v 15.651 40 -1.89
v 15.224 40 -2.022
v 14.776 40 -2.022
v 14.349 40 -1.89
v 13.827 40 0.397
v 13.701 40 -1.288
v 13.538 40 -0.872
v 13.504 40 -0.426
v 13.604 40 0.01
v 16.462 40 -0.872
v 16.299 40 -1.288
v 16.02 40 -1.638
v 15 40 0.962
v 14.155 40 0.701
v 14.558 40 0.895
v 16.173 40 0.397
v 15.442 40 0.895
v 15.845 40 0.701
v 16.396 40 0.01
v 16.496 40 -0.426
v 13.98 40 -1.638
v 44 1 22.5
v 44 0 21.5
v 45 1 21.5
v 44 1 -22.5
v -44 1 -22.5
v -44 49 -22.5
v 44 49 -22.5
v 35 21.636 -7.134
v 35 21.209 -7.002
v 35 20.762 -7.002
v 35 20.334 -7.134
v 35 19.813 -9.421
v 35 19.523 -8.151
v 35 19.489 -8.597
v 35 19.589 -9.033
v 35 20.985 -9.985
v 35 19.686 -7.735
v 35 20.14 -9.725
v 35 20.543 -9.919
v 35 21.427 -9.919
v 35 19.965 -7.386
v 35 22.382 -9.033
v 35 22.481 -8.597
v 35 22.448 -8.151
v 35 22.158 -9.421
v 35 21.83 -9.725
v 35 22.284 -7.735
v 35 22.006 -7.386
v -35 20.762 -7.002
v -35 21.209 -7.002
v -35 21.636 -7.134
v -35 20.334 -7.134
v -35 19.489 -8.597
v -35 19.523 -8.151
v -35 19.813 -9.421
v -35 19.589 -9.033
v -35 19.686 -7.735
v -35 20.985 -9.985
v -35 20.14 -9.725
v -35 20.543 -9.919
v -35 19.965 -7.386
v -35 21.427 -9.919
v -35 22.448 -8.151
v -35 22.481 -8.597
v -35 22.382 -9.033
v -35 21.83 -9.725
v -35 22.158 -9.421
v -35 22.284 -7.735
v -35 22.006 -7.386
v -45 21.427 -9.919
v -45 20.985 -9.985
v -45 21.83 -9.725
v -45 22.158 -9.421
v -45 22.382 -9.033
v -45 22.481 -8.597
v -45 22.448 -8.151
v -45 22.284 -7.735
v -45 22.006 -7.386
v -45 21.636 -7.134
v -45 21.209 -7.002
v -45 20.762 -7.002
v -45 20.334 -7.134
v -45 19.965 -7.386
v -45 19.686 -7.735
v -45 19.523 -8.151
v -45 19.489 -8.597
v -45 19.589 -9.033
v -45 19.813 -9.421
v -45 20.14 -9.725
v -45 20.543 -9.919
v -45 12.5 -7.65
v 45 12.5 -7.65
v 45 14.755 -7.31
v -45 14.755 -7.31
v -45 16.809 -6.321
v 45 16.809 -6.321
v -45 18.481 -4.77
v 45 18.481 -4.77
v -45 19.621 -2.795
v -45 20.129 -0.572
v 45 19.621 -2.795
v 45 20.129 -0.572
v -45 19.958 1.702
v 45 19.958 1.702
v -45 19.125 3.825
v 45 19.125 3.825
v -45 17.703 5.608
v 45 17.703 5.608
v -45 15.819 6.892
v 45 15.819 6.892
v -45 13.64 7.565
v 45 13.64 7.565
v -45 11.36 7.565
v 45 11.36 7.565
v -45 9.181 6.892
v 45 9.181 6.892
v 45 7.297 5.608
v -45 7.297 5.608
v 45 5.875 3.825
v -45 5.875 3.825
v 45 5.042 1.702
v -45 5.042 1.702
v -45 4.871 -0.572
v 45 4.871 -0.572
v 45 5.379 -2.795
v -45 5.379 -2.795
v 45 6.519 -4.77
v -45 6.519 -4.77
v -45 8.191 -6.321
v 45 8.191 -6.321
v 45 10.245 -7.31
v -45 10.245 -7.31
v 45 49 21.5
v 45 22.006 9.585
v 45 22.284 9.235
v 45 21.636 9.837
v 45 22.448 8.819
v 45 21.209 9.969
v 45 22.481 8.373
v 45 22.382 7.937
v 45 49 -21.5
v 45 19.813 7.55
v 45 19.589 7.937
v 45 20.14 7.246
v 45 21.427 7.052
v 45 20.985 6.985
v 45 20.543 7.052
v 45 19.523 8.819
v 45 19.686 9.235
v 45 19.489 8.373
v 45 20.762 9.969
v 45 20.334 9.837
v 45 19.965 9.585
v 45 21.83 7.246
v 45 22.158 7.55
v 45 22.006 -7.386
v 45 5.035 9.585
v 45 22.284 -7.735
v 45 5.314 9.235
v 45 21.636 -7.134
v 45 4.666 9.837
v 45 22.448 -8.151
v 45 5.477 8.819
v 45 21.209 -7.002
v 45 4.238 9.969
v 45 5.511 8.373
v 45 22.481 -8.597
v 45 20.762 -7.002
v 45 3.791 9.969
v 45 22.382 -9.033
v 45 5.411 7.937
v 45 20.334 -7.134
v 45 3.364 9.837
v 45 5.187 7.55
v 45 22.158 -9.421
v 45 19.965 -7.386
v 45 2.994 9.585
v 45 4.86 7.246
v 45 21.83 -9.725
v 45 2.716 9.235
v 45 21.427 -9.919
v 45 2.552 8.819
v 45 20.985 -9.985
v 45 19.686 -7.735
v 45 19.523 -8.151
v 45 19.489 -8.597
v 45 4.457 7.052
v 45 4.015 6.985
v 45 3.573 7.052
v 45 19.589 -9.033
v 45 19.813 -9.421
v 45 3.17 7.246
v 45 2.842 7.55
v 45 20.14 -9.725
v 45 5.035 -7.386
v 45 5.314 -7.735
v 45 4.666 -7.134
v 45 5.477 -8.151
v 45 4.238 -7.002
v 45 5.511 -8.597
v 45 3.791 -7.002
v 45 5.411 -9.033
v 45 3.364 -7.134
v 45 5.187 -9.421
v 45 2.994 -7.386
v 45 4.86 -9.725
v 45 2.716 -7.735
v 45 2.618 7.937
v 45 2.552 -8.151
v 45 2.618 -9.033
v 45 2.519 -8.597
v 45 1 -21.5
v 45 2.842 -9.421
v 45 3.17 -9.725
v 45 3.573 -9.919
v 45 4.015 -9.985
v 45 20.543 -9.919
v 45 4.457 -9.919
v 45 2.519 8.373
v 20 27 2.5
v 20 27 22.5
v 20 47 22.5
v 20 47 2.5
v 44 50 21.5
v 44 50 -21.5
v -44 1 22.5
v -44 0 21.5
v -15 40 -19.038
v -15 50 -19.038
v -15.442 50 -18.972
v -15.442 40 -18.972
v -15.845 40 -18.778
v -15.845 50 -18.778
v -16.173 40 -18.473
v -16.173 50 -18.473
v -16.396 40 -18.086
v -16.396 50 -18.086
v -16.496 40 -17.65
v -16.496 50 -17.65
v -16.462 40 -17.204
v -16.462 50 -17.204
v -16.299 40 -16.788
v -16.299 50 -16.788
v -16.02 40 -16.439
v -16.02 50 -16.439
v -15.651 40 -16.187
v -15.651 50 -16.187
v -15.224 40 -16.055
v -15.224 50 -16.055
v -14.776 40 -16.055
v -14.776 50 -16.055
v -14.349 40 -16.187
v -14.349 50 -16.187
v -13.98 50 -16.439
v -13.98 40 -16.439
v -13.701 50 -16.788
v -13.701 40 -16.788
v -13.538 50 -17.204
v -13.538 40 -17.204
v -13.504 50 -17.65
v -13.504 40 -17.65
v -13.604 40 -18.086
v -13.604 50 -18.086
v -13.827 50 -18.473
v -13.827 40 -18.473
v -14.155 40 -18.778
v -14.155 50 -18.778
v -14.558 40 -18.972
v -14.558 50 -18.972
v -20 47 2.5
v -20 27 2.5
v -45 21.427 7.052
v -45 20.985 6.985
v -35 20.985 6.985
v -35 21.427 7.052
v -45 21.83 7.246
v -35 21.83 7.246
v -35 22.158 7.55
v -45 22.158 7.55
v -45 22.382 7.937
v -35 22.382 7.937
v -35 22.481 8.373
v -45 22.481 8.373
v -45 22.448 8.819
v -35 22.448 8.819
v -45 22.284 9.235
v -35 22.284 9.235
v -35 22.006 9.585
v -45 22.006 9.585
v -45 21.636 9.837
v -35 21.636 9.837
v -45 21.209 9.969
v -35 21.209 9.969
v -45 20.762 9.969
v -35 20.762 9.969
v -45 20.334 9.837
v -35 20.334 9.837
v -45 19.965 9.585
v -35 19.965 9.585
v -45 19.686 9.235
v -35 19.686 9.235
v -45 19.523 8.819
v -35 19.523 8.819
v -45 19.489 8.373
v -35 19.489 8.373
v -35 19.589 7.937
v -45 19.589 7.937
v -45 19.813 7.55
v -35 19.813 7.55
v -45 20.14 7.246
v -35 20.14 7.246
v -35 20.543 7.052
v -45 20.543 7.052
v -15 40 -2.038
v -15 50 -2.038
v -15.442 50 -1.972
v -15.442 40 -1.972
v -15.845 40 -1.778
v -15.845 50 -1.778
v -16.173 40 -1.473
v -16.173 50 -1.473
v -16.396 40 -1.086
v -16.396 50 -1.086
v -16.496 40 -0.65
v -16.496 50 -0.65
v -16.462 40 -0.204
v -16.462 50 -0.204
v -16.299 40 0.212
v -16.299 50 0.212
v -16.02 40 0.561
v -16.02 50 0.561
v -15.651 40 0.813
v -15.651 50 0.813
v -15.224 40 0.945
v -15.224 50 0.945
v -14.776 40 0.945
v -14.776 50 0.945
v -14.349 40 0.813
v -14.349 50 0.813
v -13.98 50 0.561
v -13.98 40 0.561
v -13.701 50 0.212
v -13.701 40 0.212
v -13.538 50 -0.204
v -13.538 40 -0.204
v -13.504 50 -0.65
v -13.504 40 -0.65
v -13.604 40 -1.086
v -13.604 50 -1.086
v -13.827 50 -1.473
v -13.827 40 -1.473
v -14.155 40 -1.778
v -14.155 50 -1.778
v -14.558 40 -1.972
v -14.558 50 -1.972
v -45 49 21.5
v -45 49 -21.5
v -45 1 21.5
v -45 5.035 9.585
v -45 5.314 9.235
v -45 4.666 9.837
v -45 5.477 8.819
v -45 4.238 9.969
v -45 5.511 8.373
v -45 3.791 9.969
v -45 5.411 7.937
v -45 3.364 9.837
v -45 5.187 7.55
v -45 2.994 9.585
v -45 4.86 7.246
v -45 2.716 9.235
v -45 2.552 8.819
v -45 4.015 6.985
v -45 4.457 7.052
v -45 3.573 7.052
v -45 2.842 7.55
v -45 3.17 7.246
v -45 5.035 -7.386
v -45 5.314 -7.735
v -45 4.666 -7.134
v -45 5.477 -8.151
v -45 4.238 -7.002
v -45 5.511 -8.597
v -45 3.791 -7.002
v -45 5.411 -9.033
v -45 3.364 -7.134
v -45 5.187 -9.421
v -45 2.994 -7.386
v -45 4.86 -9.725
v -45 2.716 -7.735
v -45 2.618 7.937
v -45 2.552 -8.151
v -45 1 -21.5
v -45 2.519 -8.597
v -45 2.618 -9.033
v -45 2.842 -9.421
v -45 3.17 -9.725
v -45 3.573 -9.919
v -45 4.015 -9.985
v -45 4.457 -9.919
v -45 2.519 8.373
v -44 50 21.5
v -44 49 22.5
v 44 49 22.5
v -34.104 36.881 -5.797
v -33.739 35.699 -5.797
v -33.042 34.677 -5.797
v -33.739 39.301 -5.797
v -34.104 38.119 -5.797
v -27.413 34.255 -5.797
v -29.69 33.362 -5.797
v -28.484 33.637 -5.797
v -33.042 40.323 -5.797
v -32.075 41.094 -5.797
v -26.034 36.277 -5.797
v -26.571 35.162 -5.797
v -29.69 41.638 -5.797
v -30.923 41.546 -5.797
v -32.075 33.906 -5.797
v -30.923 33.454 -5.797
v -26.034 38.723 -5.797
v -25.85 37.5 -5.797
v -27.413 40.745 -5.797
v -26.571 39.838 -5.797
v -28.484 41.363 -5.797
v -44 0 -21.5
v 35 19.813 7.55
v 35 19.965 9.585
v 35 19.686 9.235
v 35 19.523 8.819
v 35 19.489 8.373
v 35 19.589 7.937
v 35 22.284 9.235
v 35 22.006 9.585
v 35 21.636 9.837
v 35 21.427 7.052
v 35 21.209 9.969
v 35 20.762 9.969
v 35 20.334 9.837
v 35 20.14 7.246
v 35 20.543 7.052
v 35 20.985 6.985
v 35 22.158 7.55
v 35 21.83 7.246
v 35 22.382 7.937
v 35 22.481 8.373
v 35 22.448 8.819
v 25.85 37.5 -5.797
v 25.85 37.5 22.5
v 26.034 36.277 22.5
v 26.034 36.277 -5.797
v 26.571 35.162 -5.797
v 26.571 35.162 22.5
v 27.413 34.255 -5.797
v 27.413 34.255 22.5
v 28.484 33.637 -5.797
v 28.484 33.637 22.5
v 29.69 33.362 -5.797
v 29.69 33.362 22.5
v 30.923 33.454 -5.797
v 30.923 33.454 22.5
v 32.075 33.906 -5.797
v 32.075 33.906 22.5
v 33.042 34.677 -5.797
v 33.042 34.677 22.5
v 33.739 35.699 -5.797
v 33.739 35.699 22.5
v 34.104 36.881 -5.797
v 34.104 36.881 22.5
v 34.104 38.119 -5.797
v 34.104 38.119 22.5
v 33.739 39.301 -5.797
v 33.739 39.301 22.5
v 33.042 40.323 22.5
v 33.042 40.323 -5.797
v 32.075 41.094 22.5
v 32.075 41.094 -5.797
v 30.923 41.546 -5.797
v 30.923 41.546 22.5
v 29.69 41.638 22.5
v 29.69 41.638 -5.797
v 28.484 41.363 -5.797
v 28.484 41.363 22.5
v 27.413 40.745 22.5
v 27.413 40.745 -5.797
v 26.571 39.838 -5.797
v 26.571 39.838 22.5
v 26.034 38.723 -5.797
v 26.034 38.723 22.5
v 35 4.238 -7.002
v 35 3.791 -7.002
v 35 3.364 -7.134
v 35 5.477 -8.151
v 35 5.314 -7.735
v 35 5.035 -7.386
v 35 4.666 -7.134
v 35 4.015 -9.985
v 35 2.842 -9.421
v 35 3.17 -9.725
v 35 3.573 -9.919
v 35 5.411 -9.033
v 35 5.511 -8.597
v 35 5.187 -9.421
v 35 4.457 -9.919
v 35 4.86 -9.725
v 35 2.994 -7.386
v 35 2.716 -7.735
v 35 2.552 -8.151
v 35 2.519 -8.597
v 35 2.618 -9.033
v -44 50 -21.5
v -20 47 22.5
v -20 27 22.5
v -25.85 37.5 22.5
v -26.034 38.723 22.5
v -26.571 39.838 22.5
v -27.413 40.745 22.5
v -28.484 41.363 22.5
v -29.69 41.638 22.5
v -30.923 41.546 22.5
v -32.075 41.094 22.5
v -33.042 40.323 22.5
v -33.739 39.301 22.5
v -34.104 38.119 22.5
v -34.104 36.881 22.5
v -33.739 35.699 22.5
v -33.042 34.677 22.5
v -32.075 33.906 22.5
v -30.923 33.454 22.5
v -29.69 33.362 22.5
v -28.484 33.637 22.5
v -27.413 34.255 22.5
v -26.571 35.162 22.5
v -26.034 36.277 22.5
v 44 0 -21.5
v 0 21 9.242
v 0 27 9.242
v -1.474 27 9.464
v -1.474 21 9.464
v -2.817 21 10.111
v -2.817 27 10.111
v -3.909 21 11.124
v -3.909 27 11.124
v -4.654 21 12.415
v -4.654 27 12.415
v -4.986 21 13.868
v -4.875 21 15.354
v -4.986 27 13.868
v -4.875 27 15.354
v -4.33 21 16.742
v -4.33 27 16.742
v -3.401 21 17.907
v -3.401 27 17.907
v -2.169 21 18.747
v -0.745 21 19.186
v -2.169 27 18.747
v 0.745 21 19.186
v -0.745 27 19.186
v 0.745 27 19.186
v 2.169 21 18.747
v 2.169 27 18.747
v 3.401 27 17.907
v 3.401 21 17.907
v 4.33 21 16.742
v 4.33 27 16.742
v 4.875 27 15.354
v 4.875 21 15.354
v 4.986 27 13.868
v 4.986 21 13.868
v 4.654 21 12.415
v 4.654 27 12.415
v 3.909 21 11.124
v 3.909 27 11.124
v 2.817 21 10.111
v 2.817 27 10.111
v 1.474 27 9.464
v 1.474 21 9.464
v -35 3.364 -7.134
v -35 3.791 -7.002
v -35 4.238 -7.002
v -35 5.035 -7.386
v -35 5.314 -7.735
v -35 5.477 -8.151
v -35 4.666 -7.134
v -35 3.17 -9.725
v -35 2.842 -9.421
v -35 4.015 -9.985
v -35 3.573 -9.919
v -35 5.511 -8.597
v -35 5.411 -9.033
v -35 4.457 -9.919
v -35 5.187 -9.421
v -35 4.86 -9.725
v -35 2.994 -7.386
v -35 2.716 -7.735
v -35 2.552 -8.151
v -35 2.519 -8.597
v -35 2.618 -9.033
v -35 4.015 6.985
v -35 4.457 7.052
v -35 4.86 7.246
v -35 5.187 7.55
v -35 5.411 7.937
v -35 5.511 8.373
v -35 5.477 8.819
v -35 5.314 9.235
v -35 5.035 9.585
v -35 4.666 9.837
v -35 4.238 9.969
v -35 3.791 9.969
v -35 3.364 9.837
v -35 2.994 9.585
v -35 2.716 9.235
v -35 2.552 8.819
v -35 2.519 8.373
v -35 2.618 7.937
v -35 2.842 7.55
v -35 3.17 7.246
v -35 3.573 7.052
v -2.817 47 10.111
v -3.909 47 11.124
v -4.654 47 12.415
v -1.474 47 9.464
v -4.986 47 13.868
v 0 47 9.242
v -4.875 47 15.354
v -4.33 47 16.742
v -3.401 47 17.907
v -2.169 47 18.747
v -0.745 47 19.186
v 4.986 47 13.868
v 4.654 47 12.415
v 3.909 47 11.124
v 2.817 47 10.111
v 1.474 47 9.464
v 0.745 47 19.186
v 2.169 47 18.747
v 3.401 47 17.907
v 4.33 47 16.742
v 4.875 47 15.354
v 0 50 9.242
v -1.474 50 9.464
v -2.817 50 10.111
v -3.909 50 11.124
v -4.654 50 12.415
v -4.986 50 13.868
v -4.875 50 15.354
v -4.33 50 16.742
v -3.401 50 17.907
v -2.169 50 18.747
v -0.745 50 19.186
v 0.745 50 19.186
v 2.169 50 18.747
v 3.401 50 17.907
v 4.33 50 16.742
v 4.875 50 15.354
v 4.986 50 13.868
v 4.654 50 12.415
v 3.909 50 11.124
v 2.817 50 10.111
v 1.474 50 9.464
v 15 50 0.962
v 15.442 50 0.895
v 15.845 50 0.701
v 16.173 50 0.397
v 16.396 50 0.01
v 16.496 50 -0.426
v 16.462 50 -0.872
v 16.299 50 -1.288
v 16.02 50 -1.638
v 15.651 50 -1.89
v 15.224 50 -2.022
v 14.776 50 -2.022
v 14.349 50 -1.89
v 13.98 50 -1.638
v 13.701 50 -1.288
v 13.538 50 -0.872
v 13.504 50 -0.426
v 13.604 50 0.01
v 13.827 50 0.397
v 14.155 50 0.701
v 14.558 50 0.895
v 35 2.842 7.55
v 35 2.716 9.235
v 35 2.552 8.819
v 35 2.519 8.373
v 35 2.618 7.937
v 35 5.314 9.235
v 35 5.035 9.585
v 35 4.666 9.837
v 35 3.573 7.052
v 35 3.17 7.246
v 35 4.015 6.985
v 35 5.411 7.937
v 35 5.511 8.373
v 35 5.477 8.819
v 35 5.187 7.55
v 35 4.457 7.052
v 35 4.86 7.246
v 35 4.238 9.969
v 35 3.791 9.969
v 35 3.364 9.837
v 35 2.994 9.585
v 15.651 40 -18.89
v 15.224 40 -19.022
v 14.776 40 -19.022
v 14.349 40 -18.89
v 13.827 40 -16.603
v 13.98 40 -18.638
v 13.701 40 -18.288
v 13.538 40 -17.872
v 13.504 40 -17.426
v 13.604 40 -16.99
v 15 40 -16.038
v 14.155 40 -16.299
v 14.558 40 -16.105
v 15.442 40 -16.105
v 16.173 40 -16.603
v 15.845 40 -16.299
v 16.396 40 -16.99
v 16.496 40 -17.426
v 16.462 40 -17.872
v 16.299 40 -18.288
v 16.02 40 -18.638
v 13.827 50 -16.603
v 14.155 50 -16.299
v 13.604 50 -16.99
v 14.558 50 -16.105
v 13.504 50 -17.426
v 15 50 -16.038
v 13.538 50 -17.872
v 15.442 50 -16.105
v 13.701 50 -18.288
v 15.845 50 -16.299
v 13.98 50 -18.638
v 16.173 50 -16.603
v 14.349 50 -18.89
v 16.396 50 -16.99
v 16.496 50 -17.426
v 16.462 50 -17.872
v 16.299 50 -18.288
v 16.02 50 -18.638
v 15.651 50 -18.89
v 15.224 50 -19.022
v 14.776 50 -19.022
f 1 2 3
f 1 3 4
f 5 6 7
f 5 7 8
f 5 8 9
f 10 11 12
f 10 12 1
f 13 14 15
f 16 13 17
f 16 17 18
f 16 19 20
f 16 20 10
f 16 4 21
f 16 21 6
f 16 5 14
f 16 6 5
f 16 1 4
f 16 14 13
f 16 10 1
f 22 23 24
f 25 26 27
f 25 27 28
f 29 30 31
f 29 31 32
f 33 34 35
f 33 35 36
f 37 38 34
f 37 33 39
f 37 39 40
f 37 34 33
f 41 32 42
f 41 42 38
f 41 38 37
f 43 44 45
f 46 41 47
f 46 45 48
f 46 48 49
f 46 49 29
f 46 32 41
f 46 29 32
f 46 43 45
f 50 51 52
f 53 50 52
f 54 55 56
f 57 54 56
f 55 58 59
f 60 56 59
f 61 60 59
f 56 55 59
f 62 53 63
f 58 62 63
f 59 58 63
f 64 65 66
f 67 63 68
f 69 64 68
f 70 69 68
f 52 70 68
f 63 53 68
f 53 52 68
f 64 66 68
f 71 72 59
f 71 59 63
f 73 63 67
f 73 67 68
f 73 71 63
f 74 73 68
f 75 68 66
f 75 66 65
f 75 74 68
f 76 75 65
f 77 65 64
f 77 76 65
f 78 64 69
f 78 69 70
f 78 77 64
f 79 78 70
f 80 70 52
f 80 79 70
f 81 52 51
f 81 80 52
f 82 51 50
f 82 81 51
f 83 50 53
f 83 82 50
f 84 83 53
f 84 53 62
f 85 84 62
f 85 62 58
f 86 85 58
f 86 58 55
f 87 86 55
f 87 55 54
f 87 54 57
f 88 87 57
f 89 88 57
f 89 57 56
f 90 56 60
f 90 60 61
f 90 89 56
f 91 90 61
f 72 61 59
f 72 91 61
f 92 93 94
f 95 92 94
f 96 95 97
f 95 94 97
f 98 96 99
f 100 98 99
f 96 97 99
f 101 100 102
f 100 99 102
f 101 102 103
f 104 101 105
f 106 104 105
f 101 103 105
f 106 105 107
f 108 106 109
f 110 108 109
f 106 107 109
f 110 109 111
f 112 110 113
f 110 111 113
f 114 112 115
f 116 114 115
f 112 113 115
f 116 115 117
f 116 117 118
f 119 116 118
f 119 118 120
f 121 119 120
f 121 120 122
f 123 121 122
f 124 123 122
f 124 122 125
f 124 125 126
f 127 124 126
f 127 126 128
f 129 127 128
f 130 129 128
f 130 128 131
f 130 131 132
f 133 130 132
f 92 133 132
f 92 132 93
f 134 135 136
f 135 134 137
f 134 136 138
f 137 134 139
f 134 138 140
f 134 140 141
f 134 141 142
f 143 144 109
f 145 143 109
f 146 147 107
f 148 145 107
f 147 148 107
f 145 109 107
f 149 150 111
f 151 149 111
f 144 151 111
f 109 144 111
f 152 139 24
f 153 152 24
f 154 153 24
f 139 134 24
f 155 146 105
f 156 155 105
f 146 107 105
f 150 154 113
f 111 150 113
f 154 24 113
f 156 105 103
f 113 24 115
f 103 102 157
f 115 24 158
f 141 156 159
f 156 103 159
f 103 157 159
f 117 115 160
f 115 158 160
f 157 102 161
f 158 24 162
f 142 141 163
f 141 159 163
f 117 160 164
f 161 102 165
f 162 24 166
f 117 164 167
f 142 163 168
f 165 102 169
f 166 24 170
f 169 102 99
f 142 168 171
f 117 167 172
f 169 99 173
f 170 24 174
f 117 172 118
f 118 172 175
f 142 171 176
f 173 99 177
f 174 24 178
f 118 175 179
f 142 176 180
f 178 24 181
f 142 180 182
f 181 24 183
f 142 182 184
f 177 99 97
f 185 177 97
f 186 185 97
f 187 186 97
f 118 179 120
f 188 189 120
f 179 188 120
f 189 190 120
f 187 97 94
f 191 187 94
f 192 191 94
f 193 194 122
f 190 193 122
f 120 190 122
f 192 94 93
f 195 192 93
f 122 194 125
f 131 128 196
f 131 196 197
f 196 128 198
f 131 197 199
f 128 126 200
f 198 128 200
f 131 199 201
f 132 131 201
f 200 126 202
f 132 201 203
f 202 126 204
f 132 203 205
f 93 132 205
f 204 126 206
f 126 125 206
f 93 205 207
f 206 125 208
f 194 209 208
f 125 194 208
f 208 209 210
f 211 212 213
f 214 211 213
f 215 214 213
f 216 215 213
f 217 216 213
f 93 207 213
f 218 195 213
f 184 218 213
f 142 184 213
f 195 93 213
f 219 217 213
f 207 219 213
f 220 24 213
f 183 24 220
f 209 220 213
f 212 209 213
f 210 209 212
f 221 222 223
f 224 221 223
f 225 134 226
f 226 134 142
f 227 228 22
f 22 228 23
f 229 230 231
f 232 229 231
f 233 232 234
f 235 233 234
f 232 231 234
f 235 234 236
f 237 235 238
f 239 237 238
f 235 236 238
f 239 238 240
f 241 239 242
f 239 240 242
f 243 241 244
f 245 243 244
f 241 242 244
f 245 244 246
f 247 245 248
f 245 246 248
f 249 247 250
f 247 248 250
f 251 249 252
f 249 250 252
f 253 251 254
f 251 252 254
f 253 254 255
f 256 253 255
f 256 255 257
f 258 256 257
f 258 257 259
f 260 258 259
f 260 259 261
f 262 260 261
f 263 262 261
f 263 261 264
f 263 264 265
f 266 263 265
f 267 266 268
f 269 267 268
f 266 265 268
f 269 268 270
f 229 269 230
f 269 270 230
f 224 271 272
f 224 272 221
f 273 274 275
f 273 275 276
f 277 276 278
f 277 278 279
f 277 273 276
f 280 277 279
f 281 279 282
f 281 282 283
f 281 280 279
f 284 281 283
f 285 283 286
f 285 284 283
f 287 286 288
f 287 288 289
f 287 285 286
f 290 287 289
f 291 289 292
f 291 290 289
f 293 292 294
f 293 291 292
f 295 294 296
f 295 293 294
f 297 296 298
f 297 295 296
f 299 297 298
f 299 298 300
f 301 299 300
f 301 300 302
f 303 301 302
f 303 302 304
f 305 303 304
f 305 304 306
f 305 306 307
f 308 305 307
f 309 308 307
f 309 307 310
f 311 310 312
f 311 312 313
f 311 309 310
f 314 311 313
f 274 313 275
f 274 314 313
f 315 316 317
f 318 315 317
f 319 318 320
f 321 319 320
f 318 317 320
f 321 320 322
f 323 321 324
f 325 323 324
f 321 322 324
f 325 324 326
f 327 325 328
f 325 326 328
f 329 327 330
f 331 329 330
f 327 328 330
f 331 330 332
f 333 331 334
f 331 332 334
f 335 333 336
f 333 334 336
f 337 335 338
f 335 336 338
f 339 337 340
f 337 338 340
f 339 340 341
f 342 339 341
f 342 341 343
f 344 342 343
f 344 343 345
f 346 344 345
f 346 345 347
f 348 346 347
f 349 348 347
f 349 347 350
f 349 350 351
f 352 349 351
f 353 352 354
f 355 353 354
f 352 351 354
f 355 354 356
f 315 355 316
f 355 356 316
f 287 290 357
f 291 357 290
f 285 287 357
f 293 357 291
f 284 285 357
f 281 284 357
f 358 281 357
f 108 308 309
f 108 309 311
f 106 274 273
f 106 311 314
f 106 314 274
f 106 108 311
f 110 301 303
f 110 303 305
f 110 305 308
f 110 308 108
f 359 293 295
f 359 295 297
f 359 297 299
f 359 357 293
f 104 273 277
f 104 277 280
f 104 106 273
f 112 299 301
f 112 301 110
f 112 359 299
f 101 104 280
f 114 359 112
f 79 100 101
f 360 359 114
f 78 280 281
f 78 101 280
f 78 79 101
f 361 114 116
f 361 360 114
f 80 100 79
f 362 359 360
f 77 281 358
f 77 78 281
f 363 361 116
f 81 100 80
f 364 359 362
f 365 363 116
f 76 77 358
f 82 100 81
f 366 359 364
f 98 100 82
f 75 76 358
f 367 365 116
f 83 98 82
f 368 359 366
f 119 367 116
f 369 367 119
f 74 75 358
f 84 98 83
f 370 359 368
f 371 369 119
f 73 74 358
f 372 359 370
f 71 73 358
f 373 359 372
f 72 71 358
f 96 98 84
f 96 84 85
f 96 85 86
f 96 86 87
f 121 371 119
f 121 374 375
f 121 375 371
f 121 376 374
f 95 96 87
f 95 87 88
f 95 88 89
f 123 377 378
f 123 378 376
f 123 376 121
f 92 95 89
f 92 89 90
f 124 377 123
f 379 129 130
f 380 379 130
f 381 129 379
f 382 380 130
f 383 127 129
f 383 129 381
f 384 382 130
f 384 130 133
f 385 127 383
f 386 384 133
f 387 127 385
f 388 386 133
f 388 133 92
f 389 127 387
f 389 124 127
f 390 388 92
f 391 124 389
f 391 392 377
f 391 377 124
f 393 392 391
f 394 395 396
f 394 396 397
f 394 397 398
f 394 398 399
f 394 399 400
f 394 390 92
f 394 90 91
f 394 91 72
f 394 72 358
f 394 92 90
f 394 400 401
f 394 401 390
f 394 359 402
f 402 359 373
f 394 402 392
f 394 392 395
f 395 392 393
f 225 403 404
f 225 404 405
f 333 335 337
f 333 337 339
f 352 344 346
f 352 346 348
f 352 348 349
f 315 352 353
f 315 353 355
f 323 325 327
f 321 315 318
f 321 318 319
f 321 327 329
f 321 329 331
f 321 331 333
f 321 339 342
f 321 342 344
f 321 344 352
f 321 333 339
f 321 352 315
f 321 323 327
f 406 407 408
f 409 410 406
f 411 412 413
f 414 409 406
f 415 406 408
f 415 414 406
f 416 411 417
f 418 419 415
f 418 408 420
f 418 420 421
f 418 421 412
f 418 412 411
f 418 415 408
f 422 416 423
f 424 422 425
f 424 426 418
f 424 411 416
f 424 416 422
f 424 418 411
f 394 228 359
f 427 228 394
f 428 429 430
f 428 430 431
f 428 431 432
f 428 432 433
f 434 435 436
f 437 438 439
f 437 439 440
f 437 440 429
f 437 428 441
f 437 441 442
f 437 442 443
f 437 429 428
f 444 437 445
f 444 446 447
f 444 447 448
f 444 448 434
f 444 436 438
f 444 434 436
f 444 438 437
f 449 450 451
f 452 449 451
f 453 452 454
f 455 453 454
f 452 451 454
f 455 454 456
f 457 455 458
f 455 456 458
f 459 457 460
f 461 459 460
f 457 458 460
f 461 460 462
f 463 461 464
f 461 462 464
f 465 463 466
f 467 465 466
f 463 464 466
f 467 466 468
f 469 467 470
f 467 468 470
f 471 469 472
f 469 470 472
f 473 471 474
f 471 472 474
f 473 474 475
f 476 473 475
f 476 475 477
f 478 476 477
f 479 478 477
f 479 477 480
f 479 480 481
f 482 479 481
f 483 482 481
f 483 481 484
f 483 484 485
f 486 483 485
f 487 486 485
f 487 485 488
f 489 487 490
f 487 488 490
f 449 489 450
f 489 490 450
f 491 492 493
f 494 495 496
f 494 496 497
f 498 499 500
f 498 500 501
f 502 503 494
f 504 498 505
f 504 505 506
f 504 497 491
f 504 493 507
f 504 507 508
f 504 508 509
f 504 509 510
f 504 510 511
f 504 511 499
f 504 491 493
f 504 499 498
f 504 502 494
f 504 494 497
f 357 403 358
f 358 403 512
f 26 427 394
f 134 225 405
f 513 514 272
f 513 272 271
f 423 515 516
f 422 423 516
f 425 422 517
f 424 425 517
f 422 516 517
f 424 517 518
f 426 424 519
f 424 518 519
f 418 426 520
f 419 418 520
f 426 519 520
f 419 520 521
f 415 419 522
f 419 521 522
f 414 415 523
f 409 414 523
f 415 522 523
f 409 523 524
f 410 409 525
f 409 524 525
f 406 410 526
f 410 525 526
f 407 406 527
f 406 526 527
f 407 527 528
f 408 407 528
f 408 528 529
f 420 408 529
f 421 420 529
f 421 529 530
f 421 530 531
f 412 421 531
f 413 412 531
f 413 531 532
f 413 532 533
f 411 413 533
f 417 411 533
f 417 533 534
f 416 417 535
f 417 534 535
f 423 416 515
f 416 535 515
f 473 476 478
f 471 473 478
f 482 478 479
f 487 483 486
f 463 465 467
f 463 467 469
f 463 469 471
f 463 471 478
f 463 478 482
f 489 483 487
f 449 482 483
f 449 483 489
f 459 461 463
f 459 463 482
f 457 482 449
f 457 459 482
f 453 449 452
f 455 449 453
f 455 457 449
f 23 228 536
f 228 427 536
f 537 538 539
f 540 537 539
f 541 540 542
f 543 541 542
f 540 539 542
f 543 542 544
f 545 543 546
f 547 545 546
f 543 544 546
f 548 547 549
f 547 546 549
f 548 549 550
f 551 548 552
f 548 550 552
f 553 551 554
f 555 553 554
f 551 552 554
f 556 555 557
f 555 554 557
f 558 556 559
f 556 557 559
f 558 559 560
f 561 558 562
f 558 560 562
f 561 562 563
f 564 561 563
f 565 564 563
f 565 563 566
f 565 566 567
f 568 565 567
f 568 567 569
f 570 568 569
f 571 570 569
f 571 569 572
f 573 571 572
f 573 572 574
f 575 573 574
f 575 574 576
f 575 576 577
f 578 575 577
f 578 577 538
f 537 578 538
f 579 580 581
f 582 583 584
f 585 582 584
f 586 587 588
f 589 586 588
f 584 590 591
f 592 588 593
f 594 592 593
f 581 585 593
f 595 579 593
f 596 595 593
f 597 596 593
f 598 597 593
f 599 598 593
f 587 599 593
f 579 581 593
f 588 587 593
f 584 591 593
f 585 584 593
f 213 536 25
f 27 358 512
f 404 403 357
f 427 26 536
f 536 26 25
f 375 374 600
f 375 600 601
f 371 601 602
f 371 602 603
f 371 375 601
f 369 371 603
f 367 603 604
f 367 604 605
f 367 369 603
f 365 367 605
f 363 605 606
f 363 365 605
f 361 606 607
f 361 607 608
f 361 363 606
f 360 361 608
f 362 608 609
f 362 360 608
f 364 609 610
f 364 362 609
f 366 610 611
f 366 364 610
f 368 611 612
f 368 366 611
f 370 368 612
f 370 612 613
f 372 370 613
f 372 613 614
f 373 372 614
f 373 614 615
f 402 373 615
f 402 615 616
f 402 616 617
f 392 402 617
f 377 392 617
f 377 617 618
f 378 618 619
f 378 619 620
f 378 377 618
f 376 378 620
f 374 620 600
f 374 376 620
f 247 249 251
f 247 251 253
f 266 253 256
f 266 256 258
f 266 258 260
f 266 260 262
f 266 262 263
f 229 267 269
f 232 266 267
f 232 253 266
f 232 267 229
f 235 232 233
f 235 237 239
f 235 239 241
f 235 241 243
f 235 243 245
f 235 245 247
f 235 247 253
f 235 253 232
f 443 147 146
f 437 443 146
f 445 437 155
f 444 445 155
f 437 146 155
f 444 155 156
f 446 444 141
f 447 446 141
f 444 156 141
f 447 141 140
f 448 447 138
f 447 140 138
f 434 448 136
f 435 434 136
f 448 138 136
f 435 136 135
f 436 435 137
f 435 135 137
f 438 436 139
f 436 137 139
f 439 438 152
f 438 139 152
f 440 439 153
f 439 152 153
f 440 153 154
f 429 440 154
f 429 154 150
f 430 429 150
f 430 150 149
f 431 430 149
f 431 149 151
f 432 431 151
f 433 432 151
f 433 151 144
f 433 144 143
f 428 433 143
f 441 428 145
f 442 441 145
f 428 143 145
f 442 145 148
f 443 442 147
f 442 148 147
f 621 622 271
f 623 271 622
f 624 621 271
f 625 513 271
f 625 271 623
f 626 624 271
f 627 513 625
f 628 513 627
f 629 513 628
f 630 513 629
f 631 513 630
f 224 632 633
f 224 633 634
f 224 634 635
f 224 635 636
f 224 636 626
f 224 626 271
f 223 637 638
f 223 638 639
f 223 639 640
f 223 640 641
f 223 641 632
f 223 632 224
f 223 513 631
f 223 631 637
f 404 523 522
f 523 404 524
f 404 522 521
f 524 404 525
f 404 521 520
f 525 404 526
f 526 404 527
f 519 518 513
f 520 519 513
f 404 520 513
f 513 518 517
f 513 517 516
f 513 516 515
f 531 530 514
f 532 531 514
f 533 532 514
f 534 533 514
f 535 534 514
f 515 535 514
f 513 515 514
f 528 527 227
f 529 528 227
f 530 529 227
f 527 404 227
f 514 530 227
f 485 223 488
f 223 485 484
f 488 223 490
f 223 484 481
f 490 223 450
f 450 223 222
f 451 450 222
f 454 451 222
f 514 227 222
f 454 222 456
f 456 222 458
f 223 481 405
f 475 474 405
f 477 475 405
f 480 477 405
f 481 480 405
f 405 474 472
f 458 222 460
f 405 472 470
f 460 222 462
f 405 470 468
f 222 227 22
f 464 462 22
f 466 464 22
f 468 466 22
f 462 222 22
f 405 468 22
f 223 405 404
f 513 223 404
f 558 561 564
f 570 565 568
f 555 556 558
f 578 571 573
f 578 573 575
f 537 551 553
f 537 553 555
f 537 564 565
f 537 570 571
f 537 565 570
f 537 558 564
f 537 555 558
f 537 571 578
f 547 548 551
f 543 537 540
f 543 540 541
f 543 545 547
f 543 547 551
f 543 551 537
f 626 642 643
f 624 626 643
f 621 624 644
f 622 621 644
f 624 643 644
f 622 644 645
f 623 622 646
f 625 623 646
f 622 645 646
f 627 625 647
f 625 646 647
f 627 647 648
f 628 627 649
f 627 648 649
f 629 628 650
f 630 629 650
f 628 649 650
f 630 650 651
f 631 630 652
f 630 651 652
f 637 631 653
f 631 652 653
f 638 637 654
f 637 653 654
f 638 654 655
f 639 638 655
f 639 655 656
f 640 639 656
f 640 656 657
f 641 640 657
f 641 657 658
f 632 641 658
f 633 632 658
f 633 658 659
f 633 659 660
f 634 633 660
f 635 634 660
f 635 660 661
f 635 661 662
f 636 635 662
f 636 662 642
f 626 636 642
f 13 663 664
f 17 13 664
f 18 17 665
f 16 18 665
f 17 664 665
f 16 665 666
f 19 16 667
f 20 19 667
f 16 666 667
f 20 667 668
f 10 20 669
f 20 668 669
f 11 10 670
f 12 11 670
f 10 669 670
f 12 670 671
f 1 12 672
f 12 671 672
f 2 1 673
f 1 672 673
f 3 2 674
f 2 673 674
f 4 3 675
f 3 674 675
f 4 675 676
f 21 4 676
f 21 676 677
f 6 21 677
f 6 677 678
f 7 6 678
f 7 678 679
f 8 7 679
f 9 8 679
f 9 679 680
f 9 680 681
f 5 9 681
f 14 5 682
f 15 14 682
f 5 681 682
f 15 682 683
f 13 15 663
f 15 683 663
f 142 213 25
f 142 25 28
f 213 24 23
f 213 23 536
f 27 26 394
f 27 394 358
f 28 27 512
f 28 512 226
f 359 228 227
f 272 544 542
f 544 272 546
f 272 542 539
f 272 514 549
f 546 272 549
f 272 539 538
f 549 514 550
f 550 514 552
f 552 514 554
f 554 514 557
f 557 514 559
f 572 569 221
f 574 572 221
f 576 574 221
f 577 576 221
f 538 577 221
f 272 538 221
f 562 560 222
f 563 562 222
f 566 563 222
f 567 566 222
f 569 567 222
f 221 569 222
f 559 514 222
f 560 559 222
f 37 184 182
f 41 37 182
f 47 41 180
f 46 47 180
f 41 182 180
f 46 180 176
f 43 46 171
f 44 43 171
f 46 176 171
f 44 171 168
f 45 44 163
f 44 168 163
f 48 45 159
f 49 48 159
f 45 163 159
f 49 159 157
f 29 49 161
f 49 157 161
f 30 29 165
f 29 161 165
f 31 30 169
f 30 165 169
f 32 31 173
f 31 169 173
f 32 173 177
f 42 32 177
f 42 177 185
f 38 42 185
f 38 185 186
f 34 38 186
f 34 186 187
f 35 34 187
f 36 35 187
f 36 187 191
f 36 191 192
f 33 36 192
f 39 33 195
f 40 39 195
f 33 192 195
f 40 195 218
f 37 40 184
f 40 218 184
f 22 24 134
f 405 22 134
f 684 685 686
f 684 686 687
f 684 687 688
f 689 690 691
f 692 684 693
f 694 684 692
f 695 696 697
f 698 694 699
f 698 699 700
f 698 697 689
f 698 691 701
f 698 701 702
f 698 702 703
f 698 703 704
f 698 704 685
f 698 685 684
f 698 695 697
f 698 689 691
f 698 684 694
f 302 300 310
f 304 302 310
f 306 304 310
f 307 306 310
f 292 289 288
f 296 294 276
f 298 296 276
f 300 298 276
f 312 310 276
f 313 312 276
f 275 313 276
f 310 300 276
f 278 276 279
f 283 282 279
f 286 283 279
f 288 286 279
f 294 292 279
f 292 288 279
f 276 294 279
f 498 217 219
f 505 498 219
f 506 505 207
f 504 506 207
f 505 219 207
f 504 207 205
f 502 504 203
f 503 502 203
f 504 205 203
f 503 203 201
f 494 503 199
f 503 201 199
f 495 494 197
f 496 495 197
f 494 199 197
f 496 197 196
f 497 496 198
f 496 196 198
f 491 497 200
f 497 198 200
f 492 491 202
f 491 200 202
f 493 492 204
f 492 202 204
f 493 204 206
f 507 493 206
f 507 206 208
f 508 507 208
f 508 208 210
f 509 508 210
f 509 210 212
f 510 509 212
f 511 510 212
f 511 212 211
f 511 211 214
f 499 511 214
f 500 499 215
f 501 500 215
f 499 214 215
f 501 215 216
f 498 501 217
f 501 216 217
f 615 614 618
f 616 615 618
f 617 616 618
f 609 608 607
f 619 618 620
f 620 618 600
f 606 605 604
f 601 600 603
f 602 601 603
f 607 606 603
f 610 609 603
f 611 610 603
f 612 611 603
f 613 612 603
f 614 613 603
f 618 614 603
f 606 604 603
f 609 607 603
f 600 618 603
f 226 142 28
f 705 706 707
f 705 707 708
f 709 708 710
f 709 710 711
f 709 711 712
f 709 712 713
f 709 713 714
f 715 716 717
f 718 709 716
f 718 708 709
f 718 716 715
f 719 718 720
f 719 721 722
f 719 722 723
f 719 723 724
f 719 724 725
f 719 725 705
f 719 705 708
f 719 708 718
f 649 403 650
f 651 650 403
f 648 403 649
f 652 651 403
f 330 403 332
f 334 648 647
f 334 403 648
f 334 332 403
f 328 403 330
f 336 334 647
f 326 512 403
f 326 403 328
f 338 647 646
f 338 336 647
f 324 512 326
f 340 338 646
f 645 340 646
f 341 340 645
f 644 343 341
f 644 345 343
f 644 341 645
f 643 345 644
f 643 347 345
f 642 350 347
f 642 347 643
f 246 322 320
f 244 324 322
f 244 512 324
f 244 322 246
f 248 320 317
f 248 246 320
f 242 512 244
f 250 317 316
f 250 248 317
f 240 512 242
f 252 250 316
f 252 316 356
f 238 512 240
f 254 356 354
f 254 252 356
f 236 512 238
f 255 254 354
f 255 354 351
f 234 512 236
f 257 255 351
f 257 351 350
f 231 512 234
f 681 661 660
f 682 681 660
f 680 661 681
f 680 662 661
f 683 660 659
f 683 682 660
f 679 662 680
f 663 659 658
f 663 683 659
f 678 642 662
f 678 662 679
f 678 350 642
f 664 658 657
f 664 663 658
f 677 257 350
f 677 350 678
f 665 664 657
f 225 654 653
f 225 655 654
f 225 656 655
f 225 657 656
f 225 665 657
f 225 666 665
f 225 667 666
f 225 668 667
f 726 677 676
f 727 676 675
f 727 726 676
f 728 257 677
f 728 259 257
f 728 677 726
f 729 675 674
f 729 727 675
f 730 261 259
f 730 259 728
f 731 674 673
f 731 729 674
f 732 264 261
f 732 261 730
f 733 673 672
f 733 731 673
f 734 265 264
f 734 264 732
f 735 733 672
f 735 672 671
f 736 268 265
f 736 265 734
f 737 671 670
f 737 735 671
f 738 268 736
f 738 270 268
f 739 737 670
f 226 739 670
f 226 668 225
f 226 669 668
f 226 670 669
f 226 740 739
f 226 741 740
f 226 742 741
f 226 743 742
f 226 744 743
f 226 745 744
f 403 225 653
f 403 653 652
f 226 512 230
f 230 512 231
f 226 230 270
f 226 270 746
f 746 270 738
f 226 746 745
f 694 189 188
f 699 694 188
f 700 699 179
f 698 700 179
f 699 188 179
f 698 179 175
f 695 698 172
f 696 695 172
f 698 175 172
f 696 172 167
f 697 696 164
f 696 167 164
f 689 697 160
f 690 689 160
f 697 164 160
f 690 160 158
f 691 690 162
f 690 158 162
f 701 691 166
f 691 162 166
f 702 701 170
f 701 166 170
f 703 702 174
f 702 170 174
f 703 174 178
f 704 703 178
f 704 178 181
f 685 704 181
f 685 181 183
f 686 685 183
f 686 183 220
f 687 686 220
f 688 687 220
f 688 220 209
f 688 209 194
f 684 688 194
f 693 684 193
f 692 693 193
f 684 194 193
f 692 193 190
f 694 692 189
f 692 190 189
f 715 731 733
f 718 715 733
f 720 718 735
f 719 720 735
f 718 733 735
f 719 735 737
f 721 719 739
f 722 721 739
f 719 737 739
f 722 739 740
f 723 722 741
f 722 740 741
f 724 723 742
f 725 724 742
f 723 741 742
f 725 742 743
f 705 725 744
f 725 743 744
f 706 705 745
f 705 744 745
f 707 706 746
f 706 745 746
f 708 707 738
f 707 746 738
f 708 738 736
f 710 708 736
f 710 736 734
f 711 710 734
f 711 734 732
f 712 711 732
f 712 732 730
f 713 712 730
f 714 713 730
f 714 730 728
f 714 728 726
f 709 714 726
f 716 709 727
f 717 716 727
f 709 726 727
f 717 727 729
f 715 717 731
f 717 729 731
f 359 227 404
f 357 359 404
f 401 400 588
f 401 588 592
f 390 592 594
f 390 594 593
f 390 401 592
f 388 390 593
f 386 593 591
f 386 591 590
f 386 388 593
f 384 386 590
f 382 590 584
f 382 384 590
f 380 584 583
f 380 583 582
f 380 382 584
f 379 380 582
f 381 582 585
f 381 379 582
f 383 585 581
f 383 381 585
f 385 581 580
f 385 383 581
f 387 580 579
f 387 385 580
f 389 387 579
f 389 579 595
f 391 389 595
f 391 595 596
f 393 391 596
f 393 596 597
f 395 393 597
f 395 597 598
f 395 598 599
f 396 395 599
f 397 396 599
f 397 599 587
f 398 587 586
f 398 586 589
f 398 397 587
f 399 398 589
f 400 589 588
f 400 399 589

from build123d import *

# Parameters (mm, degrees)
SKETCH1_W           = 90
SKETCH1_H           = 45
BOSS_EXTRUDE1_DEPTH = 50
SKETCH2_R           = 4.15
CUT_EXTRUDE1_DEPTH  = 28.296664924
SKETCH3_R           = 7.65
CUT_EXTRUDE2_DEPTH  = 106.386194542
SKETCH4_R           = 1.5
CUT_EXTRUDE3_DEPTH  = 10
CHAMFER1_SIZE       = 1
SKETCH5_R           = 1.5
CUT_EXTRUDE4_DEPTH  = 10
SKETCH6_W           = 40
SKETCH6_H           = 20
CUT_EXTRUDE5_DEPTH  = 20
SKETCH7_R           = 5
CUT_EXTRUDE6_DEPTH  = 29


with BuildPart() as part:
    # Sketch1 → Boss-Extrude1 (new body)
    with BuildSketch(Plane(origin=(0, 0, 0), x_dir=(1, 0, 0), z_dir=(0, 1, 0))):
        Rectangle(SKETCH1_W, SKETCH1_H)
    extrude(amount=BOSS_EXTRUDE1_DEPTH)

    # Sketch2 → Cut-Extrude1 (cut)
    with BuildSketch(Plane.XY.offset(22.5)):
        with Locations((-30, 37.5)):
            Circle(SKETCH2_R)
        with Locations(Location((30, 37.5, 0), (0, 0, 180))):
            Circle(SKETCH2_R)
    extrude(amount=-CUT_EXTRUDE1_DEPTH, mode=Mode.SUBTRACT)

    # Sketch3 → Cut-Extrude2 (cut, through all)
    with BuildSketch(Plane(origin=(45, 0, 0), x_dir=(0, 0, -1), z_dir=(1, 0, 0))):
        with Locations((0, 12.5)):
            Circle(SKETCH3_R)
    extrude(amount=-CUT_EXTRUDE2_DEPTH, mode=Mode.SUBTRACT)

    # Sketch4 → Cut-Extrude3 (cut)
    with BuildSketch(Plane(origin=(45, 0, 0), x_dir=(0, 0, -1), z_dir=(1, 0, 0))):
        with Locations((-8.485281374, 20.985281374)):
            Circle(SKETCH4_R)
        with Locations((8.485281374, 20.985281374)):
            Circle(SKETCH4_R)
        with Locations((8.485281374, 4.014718626)):
            Circle(SKETCH4_R)
        with Locations((-8.485281374, 4.014718626)):
            Circle(SKETCH4_R)
    cut_extrude3 = extrude(amount=-CUT_EXTRUDE3_DEPTH, mode=Mode.SUBTRACT)

    # Mirror1: Cut-Extrude3 across plane
    add(cut_extrude3.mirror(Plane(origin=(0, 0, 0), x_dir=(0, 0, 1), z_dir=(1, 0, 0))), mode=Mode.SUBTRACT)

    # Chamfer1
    chamfer1_edges = [part.edges().sort_by_distance(p)[0] for p in [
        (-45, 50, 0),
        (0, 50, 22.5),
        (45, 50, 0),
        (0, 0, 22.5),
        (-45, 0, 0),
        (0, 0, -22.5),
        (45, 0, 0),
        (45, 25, 22.5),
        (-45, 25, 22.5),
        (-45, 25, -22.5),
        (45, 25, -22.5),
        (0, 50, -22.5),
    ]]
    chamfer(chamfer1_edges, length=CHAMFER1_SIZE)

    # Sketch5 → Cut-Extrude4 (cut)
    with BuildSketch(Plane(origin=(0, 50, 0), x_dir=(1, 0, 0), z_dir=(0, 1, 0))):
        with Locations(Location((15, 0.53825434, 0), (0, 0, 270))):
            Circle(SKETCH5_R)
        with Locations(Location((15, 17.53825434, 0), (0, 0, 270))):
            Circle(SKETCH5_R)
        with Locations(Location((-15, 17.53825434, 0), (0, 0, 90))):
            Circle(SKETCH5_R)
        with Locations(Location((-15, 0.53825434, 0), (0, 0, 90))):
            Circle(SKETCH5_R)
    extrude(amount=-CUT_EXTRUDE4_DEPTH, mode=Mode.SUBTRACT)

    # Sketch6 → Cut-Extrude5 (cut)
    with BuildSketch(Plane.XY.offset(22.5)):
        with Locations((0, 37)):
            Rectangle(SKETCH6_W, SKETCH6_H)
    extrude(amount=-CUT_EXTRUDE5_DEPTH, mode=Mode.SUBTRACT)

    # Sketch7 → Cut-Extrude6 (cut)
    with BuildSketch(Plane(origin=(0, 50, 0), x_dir=(1, 0, 0), z_dir=(0, 1, 0))):
        with Locations(Location((0, -14.241832216, 0), (0, 0, 90))):
            Circle(SKETCH7_R)
    extrude(amount=-CUT_EXTRUDE6_DEPTH, mode=Mode.SUBTRACT)


solid = part.part
